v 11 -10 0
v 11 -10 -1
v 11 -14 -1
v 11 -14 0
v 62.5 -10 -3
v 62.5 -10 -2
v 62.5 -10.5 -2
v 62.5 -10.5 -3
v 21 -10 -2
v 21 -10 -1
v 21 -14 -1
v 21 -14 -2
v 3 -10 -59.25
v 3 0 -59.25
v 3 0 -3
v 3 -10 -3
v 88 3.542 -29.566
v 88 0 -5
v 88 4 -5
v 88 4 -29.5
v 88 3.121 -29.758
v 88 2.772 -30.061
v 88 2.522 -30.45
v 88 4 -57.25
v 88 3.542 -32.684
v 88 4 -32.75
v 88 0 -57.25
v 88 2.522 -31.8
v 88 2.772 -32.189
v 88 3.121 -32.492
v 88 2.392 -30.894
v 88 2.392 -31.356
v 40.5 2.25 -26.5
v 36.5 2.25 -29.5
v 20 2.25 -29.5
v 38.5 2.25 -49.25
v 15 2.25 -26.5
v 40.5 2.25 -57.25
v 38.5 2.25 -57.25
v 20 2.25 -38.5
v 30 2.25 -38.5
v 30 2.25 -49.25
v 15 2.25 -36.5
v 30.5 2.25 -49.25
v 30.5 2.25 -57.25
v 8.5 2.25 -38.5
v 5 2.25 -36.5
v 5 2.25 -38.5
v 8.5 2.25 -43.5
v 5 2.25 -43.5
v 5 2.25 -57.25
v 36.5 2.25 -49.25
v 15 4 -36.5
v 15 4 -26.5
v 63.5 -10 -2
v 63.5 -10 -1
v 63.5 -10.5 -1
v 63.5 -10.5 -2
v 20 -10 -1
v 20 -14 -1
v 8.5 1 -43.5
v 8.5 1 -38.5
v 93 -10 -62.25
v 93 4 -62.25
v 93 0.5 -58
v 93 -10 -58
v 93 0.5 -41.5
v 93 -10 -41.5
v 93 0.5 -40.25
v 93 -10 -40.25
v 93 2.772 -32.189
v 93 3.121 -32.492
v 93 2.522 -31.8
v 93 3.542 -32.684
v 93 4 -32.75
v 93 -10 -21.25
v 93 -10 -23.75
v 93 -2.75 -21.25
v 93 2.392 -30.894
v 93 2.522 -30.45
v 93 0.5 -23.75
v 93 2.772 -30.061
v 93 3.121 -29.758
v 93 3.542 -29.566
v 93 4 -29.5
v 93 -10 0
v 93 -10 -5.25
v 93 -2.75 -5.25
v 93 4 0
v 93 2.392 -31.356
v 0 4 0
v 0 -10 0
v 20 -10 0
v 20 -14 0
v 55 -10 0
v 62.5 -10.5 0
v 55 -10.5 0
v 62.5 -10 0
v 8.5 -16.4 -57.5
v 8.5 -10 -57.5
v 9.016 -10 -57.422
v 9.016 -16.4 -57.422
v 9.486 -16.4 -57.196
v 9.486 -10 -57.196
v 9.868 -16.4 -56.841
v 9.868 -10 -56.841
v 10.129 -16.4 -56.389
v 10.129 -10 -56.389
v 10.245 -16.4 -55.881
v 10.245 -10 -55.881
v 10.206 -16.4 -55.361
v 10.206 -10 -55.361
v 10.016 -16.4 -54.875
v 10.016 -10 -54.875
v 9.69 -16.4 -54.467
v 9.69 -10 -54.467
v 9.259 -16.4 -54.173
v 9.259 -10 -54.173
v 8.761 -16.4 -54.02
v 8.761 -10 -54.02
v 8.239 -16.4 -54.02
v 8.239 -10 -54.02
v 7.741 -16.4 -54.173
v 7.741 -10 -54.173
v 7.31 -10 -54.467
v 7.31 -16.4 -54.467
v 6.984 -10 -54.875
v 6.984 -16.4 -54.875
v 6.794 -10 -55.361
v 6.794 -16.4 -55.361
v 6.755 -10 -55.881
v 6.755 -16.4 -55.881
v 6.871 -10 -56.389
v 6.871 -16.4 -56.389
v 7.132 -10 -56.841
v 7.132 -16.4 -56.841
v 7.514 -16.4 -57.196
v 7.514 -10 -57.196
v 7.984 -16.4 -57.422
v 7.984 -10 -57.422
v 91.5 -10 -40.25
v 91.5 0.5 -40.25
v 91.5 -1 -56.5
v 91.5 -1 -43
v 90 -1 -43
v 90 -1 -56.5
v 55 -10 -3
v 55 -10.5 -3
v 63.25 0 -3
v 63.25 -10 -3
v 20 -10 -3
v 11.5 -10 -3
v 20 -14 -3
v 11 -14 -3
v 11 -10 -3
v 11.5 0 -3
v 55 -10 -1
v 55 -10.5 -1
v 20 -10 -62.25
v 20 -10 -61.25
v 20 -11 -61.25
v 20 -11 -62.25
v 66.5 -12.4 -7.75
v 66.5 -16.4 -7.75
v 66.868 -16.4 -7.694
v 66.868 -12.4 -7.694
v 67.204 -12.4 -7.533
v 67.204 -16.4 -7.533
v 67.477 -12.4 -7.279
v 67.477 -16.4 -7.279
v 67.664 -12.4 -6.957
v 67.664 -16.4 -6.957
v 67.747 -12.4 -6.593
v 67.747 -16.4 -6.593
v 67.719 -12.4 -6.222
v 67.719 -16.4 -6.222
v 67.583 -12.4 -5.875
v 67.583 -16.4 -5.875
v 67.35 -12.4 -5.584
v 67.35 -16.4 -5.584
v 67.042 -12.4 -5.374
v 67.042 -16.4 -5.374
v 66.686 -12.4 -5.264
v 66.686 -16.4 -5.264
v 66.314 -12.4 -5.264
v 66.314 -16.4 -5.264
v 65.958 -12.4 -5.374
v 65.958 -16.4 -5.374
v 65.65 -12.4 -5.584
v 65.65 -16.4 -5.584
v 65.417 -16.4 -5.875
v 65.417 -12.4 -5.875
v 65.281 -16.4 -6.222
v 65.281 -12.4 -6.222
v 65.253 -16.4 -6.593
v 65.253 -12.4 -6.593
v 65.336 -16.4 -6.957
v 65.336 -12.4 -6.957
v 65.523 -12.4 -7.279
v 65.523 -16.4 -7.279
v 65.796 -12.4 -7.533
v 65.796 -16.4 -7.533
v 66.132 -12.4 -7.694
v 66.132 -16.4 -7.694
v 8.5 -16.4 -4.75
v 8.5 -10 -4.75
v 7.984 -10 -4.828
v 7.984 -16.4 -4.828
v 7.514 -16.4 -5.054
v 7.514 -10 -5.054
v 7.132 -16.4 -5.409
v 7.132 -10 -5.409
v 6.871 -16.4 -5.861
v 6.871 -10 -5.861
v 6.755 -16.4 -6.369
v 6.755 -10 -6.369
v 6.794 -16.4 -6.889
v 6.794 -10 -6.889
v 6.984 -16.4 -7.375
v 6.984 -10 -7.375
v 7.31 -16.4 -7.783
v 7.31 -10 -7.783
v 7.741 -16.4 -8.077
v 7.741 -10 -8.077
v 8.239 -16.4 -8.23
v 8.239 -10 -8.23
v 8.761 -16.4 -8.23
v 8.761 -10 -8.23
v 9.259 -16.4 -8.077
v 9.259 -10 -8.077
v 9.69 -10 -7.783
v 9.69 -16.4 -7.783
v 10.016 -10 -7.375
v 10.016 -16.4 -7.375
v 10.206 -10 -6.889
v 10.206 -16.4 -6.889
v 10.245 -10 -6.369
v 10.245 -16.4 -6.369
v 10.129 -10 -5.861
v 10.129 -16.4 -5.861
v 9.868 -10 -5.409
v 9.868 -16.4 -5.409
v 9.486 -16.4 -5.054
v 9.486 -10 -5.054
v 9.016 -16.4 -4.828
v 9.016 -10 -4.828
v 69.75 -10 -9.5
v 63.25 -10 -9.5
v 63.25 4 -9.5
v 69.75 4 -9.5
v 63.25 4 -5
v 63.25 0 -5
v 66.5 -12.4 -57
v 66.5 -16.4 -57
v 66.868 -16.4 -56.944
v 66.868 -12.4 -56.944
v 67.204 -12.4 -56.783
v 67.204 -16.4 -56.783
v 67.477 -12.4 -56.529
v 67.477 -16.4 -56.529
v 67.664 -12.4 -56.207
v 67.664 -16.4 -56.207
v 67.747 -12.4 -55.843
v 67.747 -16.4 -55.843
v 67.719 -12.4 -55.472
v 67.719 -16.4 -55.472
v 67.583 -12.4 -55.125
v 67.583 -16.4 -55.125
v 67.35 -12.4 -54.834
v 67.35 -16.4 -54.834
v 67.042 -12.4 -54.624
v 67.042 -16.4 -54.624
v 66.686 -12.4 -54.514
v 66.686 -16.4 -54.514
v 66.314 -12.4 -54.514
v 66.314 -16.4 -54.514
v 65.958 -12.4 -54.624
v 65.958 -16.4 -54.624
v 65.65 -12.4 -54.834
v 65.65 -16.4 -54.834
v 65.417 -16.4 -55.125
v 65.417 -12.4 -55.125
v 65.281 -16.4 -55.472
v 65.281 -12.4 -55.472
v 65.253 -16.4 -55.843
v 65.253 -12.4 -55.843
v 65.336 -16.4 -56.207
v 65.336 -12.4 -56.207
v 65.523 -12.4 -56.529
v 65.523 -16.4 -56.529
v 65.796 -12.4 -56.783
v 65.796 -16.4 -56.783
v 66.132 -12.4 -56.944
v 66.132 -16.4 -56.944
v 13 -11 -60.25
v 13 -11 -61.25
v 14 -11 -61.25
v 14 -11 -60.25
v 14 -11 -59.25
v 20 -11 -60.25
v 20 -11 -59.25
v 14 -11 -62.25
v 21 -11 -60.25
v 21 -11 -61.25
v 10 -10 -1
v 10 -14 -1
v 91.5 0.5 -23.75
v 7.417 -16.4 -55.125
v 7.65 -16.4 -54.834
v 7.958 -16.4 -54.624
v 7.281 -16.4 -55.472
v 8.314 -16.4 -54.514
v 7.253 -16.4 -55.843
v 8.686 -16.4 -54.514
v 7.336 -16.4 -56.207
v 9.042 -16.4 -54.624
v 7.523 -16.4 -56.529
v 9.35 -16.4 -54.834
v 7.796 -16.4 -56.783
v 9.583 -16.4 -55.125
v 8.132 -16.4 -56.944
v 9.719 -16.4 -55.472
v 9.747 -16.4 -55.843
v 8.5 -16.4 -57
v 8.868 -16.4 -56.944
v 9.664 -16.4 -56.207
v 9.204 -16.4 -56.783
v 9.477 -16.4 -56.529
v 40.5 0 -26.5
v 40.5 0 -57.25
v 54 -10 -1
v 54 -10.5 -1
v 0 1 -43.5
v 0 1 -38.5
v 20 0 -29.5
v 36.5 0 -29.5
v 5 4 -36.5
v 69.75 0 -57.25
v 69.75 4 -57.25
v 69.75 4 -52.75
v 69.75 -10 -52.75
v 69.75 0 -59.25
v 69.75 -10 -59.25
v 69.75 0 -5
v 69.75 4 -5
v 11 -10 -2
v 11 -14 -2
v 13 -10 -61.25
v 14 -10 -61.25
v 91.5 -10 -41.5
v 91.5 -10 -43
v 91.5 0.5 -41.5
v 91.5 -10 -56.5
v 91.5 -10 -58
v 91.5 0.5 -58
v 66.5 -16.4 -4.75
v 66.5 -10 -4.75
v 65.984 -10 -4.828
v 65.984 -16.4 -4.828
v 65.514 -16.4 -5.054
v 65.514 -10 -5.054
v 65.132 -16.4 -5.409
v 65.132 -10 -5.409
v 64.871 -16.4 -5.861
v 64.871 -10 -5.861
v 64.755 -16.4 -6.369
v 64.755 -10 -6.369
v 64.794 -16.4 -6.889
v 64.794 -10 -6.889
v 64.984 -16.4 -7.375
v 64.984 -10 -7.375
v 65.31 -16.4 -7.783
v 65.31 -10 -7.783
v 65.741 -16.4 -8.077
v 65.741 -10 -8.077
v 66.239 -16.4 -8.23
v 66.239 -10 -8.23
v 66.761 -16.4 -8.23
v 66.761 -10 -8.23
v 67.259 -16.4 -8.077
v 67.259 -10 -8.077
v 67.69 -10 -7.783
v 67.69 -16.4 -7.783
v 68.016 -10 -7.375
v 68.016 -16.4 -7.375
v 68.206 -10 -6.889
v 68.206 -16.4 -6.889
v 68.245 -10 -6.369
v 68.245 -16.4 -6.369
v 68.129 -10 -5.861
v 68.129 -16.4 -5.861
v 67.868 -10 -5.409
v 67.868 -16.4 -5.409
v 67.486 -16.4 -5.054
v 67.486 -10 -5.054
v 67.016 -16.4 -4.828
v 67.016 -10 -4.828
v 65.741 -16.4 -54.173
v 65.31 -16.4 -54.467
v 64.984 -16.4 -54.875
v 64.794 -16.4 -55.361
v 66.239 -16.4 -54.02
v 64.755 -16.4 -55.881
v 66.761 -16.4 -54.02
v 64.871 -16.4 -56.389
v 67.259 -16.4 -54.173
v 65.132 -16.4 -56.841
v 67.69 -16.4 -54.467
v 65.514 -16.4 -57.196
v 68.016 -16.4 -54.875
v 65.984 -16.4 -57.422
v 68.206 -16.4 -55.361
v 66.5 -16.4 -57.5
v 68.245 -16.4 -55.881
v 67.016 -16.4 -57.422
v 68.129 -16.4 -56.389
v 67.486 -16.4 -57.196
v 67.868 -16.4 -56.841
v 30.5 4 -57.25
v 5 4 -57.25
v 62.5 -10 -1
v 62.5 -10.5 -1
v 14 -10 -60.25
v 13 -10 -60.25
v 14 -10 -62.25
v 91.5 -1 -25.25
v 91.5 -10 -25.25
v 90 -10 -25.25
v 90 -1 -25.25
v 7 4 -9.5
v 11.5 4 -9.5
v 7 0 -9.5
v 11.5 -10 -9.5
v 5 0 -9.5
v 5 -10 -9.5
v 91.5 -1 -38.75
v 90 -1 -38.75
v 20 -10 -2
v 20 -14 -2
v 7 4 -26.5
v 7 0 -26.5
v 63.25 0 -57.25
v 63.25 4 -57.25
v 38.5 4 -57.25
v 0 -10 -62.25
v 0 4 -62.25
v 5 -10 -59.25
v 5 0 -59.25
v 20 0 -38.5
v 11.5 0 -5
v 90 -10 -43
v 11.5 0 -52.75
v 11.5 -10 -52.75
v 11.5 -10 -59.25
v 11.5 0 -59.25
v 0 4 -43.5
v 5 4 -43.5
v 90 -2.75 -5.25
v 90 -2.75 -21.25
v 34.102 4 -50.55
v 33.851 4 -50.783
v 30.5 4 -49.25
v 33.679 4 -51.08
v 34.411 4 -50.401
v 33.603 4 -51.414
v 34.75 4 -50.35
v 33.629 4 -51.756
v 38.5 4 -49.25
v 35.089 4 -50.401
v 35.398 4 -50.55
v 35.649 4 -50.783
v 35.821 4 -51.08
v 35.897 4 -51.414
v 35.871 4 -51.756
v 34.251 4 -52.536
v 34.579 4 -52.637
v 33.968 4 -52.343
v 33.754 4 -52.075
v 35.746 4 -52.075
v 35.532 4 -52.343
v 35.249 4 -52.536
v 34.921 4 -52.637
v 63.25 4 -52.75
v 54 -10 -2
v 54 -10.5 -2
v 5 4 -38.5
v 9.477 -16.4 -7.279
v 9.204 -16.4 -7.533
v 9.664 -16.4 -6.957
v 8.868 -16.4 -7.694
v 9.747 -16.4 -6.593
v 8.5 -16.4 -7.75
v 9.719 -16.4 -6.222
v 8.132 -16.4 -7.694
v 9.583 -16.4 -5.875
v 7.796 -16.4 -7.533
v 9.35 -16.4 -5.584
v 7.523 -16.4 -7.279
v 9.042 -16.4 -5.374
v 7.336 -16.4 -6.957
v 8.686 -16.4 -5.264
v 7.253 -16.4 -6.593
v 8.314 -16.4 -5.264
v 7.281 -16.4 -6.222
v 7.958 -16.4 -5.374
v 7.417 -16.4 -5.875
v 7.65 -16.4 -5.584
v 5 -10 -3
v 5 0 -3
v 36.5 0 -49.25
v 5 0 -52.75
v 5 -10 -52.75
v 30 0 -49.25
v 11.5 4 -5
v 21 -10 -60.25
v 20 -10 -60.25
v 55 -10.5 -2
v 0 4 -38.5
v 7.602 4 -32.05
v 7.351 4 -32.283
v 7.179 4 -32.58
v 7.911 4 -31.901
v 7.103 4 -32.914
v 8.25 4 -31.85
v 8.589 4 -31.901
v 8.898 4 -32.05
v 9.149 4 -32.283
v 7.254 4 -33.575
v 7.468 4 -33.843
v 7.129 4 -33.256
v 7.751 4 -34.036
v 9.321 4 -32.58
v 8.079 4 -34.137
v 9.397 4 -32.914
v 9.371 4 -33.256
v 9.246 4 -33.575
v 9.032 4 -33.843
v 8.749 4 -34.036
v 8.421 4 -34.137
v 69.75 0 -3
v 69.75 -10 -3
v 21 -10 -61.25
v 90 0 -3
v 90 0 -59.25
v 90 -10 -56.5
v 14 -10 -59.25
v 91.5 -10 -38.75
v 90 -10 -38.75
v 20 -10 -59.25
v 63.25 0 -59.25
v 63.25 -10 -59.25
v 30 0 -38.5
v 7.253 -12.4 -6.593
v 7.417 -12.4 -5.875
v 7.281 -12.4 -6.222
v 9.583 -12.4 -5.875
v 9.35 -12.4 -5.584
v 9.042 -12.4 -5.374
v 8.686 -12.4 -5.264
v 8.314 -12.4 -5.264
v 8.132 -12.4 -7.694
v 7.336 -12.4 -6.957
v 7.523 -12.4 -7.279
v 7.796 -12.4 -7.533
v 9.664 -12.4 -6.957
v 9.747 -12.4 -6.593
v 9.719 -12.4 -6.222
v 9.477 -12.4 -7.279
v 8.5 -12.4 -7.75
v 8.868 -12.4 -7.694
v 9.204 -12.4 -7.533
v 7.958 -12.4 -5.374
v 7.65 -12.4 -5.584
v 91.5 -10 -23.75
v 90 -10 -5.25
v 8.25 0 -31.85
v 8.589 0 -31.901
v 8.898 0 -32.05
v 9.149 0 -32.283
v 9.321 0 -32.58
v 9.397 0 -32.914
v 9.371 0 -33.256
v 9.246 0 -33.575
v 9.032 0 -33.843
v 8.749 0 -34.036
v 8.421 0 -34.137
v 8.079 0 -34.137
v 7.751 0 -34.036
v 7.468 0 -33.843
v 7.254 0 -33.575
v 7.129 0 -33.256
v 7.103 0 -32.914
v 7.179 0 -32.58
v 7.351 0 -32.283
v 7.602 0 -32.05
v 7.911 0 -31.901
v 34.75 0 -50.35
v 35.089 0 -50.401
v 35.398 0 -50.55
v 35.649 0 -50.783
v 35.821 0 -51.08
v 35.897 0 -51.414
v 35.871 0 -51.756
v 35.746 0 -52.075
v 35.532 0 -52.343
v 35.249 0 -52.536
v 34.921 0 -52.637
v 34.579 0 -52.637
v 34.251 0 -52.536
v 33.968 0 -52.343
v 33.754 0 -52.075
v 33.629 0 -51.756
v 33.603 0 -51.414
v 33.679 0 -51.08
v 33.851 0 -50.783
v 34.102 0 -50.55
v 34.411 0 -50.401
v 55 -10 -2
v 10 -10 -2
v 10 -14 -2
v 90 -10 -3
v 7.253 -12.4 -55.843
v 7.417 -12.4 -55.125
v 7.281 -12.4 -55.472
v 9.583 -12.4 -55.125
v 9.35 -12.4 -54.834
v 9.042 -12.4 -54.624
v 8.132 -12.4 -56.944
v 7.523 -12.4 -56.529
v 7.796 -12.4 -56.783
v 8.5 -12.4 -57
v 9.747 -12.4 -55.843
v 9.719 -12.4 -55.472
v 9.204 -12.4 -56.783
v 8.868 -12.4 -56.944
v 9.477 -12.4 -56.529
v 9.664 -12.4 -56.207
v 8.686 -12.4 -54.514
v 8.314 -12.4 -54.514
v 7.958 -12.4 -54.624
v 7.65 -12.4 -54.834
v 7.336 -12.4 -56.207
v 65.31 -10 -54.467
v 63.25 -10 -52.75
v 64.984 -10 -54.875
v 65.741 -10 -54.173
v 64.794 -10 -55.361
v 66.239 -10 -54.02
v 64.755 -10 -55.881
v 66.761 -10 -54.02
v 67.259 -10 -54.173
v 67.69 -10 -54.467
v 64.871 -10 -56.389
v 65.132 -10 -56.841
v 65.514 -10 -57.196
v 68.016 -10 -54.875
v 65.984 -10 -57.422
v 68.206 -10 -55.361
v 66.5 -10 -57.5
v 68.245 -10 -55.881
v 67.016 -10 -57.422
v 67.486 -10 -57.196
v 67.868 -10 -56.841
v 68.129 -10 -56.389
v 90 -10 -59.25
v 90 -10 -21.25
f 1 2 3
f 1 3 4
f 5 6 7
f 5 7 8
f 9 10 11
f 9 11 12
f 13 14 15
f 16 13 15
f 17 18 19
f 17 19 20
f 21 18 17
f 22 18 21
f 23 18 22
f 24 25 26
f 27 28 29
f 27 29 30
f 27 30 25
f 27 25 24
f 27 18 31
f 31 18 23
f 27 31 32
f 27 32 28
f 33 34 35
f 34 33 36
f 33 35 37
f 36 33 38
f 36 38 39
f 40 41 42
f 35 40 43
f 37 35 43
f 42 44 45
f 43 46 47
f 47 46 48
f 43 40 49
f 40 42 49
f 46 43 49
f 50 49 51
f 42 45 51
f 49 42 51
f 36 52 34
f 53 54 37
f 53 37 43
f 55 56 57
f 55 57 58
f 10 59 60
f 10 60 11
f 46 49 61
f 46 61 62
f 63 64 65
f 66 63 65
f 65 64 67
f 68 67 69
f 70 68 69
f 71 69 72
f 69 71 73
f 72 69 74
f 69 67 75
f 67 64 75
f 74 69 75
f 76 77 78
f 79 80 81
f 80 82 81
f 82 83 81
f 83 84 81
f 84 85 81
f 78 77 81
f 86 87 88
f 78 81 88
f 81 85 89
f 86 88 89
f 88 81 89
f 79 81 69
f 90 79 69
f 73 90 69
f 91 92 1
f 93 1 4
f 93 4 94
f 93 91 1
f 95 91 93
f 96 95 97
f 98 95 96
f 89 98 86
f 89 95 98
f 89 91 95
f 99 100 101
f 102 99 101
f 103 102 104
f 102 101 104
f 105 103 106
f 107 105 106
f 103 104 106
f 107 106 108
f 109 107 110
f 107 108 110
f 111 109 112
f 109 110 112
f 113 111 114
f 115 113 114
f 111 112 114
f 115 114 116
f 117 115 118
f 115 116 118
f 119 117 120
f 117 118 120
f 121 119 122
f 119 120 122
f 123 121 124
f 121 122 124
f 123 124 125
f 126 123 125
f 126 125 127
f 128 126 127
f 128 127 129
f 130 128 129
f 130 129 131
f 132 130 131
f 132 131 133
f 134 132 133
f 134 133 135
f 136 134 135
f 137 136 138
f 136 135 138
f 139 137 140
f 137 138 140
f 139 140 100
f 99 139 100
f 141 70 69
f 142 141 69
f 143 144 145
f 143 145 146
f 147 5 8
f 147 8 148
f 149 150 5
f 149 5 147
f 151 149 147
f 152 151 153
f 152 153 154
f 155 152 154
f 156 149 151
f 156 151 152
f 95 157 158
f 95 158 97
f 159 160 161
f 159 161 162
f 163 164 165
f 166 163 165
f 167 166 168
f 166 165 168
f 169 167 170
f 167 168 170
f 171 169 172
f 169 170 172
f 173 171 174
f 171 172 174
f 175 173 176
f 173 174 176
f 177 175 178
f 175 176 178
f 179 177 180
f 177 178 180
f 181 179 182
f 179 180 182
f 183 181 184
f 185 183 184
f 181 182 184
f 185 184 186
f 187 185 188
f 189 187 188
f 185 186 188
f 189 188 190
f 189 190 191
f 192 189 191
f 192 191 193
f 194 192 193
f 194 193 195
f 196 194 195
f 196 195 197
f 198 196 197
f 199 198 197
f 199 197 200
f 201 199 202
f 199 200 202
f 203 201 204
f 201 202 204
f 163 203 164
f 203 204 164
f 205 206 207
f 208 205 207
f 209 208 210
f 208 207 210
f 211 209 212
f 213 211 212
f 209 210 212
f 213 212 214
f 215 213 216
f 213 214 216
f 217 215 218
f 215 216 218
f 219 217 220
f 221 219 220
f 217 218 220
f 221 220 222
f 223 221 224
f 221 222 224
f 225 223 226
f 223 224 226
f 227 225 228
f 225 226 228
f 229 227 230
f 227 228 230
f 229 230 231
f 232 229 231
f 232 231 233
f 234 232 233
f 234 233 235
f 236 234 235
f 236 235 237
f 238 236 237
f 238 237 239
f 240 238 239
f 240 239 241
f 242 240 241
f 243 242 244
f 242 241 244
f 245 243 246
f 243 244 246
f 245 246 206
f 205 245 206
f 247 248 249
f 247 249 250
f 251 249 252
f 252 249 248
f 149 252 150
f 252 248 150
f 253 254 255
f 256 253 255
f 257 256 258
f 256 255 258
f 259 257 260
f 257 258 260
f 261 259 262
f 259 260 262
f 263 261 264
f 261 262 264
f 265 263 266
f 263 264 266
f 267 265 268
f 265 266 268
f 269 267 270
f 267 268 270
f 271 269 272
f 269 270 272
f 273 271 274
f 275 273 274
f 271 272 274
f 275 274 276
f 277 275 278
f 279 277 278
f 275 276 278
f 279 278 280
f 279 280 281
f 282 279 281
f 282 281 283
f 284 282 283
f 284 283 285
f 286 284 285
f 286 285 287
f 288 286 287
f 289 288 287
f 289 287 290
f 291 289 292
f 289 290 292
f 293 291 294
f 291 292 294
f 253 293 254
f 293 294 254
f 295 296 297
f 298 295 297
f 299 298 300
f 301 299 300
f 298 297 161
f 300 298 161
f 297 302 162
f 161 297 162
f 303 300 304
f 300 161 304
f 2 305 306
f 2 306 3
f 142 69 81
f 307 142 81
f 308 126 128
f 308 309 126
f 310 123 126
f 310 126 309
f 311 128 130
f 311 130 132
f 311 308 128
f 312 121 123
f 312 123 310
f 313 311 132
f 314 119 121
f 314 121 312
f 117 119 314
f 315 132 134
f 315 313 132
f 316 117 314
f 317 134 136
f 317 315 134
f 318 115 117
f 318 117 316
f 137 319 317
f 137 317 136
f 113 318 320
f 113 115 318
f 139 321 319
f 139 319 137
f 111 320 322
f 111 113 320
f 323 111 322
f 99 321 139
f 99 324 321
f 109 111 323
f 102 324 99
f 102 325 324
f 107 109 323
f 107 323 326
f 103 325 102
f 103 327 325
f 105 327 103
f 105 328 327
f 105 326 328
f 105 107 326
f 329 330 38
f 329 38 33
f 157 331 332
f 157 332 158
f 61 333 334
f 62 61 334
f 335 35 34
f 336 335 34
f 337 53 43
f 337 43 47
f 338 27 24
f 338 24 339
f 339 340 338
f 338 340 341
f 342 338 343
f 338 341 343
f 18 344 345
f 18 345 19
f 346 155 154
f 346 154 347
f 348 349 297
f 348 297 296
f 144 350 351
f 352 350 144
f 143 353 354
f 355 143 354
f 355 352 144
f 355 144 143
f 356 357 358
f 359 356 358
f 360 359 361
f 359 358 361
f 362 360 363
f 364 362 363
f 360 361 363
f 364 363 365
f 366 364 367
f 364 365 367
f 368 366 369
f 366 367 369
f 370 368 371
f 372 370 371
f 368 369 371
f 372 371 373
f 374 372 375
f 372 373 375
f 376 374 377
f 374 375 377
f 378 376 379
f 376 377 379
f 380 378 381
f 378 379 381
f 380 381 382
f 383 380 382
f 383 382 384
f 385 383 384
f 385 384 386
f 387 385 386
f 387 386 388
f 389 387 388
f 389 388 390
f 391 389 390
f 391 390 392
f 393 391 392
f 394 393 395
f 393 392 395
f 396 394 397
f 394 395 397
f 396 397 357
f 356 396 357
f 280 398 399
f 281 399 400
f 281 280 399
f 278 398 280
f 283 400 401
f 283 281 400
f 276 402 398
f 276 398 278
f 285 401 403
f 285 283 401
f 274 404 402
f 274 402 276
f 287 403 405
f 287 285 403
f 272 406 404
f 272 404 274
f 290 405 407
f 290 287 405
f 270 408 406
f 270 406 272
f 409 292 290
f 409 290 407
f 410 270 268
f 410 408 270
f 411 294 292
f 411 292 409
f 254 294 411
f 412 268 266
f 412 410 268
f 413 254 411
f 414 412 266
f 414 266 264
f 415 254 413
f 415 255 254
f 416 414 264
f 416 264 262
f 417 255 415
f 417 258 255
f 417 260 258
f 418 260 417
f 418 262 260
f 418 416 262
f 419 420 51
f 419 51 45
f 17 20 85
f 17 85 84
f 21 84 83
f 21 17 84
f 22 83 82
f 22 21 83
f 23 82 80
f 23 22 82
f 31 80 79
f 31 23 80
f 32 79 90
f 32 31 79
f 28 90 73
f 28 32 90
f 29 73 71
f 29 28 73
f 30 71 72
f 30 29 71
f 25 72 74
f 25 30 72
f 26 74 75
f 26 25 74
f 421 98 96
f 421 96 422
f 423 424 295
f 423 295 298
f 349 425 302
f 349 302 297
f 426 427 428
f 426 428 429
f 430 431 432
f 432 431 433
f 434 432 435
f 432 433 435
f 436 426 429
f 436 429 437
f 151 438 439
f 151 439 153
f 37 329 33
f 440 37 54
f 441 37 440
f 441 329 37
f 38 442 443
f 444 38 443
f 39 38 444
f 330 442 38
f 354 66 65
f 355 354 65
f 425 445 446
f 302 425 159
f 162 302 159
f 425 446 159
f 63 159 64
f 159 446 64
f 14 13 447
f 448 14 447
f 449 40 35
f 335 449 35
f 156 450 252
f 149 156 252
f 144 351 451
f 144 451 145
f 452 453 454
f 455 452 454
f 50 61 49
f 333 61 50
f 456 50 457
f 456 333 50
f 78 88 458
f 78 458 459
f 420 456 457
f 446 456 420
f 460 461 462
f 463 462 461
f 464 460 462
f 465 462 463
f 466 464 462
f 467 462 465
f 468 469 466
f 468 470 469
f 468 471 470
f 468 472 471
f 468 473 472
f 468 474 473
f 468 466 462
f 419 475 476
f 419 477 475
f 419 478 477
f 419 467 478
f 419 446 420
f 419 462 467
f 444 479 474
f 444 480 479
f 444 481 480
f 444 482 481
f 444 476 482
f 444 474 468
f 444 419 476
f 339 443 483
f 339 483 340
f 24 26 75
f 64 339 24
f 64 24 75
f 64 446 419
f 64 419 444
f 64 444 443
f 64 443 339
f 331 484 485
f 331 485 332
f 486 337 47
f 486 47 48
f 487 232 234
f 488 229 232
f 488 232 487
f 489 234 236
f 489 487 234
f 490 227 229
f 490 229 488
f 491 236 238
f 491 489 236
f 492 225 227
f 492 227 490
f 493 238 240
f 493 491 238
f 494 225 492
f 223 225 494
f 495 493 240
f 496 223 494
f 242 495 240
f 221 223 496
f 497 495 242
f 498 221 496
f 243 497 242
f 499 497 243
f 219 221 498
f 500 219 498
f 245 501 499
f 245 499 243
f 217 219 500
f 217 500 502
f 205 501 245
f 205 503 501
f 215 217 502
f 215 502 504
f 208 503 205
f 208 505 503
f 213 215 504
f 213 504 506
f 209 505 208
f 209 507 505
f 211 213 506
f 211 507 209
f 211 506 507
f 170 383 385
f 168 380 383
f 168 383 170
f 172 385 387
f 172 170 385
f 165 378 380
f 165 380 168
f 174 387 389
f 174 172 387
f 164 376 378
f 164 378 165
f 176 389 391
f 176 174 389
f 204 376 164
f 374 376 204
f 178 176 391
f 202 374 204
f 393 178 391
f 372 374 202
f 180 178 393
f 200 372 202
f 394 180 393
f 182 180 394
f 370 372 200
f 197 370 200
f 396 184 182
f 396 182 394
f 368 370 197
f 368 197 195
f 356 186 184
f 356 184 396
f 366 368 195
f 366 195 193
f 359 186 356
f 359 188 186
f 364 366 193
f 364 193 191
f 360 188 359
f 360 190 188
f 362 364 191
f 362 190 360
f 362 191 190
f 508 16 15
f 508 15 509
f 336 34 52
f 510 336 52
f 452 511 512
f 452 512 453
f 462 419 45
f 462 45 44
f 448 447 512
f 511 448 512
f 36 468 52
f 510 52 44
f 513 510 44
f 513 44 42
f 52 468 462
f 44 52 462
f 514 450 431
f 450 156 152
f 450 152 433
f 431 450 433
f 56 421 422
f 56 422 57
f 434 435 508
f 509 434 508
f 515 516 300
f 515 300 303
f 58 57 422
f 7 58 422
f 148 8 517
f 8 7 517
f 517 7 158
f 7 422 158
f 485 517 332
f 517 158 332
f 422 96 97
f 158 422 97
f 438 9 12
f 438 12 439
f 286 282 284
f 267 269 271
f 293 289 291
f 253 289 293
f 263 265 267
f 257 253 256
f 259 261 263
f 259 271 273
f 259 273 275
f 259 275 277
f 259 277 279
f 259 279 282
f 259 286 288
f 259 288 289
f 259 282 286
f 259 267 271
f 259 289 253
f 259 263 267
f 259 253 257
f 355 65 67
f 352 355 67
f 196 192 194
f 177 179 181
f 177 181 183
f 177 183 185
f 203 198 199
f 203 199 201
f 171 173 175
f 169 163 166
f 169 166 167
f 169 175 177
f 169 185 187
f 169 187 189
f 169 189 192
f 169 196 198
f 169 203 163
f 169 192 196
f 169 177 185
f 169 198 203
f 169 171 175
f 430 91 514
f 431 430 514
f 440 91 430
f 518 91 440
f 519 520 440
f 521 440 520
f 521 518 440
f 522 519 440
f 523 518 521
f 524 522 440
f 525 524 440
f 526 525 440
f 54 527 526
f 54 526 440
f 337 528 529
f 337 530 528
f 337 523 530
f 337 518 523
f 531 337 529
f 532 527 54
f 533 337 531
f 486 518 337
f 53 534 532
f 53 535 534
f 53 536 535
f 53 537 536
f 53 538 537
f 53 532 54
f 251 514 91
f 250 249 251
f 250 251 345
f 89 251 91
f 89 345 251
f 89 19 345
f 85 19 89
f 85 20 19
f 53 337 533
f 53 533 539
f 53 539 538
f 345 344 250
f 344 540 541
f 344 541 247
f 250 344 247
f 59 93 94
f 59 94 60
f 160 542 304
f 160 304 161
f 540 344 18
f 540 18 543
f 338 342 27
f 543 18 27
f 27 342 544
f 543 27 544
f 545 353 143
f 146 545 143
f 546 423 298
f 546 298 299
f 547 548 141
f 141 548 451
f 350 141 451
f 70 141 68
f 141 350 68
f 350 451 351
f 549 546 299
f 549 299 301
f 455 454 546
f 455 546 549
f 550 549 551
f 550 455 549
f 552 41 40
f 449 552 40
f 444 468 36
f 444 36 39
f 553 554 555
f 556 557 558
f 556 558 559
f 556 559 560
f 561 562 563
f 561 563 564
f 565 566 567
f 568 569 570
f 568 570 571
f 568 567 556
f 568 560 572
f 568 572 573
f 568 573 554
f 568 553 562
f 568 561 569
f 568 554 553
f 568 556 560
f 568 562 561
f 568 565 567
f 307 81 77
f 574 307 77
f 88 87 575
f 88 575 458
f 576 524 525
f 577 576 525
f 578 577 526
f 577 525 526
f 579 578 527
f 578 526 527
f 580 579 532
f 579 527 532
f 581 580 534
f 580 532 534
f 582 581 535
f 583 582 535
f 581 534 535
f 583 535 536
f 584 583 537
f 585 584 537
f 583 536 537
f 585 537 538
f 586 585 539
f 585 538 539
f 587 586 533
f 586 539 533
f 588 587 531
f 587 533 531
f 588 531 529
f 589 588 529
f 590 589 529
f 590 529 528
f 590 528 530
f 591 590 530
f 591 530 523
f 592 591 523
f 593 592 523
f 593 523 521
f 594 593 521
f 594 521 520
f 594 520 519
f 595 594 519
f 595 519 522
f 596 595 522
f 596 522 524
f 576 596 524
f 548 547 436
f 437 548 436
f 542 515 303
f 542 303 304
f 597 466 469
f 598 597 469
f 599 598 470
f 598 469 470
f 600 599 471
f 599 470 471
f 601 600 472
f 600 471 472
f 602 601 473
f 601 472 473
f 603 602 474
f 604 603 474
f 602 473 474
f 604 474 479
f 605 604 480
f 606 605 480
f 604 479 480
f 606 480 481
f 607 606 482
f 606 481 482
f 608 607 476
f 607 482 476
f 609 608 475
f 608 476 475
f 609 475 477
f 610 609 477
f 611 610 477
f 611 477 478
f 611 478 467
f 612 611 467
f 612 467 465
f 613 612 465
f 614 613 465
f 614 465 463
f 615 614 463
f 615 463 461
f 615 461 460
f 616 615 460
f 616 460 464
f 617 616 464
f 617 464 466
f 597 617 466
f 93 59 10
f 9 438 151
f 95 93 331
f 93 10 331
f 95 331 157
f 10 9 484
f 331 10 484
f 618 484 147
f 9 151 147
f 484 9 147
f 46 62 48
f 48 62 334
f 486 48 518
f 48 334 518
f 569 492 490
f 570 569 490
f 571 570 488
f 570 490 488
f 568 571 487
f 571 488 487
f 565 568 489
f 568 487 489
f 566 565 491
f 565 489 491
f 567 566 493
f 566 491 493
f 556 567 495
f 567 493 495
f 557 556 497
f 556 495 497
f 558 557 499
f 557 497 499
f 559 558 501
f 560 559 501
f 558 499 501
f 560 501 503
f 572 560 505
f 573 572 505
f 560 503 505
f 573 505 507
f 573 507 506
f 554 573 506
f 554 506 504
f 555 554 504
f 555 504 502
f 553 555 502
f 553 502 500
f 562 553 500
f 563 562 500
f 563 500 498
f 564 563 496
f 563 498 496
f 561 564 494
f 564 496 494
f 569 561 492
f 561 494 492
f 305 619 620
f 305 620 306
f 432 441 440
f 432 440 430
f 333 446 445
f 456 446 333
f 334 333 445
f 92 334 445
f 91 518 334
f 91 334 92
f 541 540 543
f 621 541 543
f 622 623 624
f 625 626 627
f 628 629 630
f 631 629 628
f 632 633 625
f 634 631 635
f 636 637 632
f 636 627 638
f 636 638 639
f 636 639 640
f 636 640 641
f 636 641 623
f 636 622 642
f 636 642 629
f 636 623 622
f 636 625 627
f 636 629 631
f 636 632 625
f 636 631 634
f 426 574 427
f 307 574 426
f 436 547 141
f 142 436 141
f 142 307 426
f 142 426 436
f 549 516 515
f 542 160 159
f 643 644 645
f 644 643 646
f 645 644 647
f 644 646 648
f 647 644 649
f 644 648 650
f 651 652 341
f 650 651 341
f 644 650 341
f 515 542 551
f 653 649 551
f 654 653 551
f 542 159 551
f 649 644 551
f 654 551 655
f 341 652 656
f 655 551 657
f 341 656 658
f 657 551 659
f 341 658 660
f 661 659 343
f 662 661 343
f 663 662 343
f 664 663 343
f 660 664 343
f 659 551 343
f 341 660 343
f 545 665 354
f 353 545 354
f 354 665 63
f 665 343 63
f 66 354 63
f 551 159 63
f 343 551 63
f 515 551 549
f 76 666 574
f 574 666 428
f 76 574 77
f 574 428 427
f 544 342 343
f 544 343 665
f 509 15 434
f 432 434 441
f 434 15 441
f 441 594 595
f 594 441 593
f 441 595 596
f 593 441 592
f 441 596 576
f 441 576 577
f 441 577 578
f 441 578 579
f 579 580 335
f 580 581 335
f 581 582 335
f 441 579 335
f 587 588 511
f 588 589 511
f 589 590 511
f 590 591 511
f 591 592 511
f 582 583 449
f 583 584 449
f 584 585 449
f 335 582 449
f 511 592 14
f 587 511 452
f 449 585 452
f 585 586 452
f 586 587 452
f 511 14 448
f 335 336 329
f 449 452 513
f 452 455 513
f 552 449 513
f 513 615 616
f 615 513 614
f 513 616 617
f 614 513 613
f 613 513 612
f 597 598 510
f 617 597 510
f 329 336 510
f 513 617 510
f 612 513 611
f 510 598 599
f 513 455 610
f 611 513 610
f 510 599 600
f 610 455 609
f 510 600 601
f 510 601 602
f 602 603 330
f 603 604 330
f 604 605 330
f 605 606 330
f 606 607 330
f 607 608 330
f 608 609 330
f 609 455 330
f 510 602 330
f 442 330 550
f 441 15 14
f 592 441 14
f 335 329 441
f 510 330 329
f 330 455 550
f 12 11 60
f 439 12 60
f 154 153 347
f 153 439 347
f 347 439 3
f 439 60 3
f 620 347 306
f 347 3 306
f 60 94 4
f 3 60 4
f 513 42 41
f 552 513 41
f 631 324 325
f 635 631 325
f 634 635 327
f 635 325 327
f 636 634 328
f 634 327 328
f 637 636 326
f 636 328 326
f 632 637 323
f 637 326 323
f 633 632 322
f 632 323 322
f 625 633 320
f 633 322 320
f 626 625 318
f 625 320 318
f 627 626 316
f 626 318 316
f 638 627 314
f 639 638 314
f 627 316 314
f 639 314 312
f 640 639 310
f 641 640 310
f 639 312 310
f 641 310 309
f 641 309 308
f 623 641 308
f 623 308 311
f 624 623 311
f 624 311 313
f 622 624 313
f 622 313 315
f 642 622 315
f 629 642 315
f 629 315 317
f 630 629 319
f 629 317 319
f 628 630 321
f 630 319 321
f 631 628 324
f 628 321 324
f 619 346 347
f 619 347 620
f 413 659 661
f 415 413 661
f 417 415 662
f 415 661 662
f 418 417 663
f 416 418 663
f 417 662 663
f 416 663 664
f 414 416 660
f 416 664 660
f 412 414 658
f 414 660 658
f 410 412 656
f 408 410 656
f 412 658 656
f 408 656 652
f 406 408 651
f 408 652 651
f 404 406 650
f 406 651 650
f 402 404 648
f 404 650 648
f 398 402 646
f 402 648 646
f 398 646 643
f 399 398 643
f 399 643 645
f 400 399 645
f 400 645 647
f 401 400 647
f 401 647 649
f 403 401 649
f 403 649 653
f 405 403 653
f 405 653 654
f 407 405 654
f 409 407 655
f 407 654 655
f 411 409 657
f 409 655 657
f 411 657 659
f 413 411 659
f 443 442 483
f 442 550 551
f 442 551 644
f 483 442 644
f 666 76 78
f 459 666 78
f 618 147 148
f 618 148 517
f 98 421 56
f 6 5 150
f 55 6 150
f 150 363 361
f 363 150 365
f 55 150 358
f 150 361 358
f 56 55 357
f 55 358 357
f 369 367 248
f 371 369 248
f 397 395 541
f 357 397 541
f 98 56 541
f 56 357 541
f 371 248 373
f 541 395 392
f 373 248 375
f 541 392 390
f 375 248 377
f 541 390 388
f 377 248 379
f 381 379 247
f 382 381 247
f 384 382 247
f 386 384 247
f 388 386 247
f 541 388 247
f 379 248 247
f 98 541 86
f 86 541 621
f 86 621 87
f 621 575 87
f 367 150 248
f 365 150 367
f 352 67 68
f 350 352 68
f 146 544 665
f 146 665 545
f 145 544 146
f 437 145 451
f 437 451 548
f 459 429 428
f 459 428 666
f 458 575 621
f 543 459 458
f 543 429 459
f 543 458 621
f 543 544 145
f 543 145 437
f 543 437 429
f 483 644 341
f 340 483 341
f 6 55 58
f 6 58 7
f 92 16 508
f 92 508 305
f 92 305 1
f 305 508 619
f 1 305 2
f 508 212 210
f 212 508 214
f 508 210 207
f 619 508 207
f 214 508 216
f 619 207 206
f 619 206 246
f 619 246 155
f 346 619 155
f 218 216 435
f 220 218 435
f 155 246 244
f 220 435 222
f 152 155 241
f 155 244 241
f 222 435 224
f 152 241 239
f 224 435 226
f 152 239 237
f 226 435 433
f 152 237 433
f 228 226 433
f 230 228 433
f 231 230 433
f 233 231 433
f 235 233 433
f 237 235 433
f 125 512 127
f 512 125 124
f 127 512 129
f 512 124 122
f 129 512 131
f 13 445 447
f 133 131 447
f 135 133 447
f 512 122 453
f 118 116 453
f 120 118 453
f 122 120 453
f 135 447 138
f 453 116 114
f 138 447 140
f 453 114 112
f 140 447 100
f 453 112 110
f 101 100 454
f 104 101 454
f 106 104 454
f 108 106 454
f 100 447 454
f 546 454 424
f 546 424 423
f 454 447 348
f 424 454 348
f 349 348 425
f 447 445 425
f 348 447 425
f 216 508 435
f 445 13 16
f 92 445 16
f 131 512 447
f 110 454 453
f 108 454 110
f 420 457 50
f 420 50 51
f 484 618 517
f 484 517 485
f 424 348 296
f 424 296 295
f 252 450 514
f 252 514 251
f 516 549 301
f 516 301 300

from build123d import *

# Parameters (mm, degrees)
SKETCH1_W               = 93
SKETCH1_H               = 62.25
BOSS_EXTRUDE1_DEPTH     = 4
CUT_EXTRUDE1_DEPTH      = 1.75
CUT_EXTRUDE2_DEPTH      = 112.933574052
SKETCH7_R               = 1.15
CUT_EXTRUDE3_DEPTH      = 112.982420495
SKETCH8_W               = 93
SKETCH8_H               = 62.25
SKETCH8_W_2             = 87
SKETCH8_H_2             = 56.25
BOSS_EXTRUDE3_DEPTH     = 10
BOSS_EXTRUDE7_START     = -14
SKETCH16_W              = 6.5
SKETCH16_H              = 4.5
SKETCH16_H_2            = 2
SKETCH16_W_2            = 4.5
BOSS_EXTRUDE7_DEPTH     = 14
SKETCH9_W               = 16
SKETCH9_H               = 7.25
SKETCH9_W_2             = 13.5
SKETCH9_H_2             = 9
CUT_EXTRUDE4_DEPTH      = 3
CUT_EXTRUDE5_DEPTH      = 1.5
CUT_EXTRUDE6_DEPTH      = 113.356853374
CUT_EXTRUDE6_DEPTH_BACK = 5
BOSS_EXTRUDE4_DEPTH     = 1
BOSS_EXTRUDE5_DEPTH     = 4
SKETCH14_W              = 5
SKETCH14_H              = 3
CUT_EXTRUDE8_DEPTH      = 8.5
BOSS_EXTRUDE6_DEPTH     = 0.5
SKETCH17_W              = 6.5
SKETCH17_H              = 4.5
CUT_EXTRUDE9_DEPTH      = 1.75
SKETCH18_R              = 1.75
BOSS_EXTRUDE8_DEPTH     = 6.4
SKETCH19_R              = 1.25
CUT_EXTRUDE10_DEPTH     = 4


with BuildPart() as part:
    # Sketch1 → Boss-Extrude1 (new body)
    with BuildSketch(Plane(origin=(0, 0, 0), x_dir=(1, 0, 0), z_dir=(0, 1, 0))):
        with Locations((46.5, 31.125)):
            Rectangle(SKETCH1_W, SKETCH1_H)
        Polygon((7, 5), (88, 5), (88, 57.25), (40.5, 57.25), (40.5, 26.5), (7, 26.5), align=None, mode=Mode.SUBTRACT)
    extrude(amount=BOSS_EXTRUDE1_DEPTH)

    # Sketch5 → Cut-Extrude1 (cut)
    with BuildSketch(Plane(origin=(0, 4, 0), x_dir=(1, 0, 0), z_dir=(0, 1, 0))):
        Polygon((40.5, 26.5), (15, 26.5), (15, 36.5), (5, 36.5), (5, 57.25), (30.5, 57.25), (30.5, 49.25), (38.5, 49.25), (38.5, 57.25), (40.5, 57.25), align=None)
    extrude(amount=-CUT_EXTRUDE1_DEPTH, mode=Mode.SUBTRACT)

    # Sketch6 → Cut-Extrude2 (cut, through all)
    with BuildSketch(Plane(origin=(0, 2.25, 0), x_dir=(1, 0, 0), z_dir=(0, 1, 0))):
        Polygon((30.5, 49.25), (30, 49.25), (30, 38.5), (20, 38.5), (20, 29.5), (28.25, 29.5), (36.5, 29.5), (36.5, 39.375), (36.5, 49.25), align=None)
    extrude(amount=-CUT_EXTRUDE2_DEPTH, mode=Mode.SUBTRACT)

    # Sketch7 → Cut-Extrude3 (cut, through all)
    with BuildSketch(Plane(origin=(0, 4, 0), x_dir=(1, 0, 0), z_dir=(0, 1, 0))):
        with Locations(Location((8.25, 33, 0), (0, 0, 270))):
            Circle(SKETCH7_R)
        with Locations(Location((34.75, 51.5, 0), (0, 0, 270))):
            Circle(SKETCH7_R)
    extrude(amount=-CUT_EXTRUDE3_DEPTH, mode=Mode.SUBTRACT)

    # Sketch8 → Boss-Extrude3 (add)
    with BuildSketch(Plane.XZ):
        with Locations((46.5, -31.125)):
            Rectangle(SKETCH8_W, SKETCH8_H)
        with Locations((46.5, -31.125)):
            Rectangle(SKETCH8_W_2, SKETCH8_H_2, mode=Mode.SUBTRACT)
    extrude(amount=BOSS_EXTRUDE3_DEPTH)

    # Sketch16 → Boss-Extrude7 (add)
    with BuildSketch(Plane(origin=(0, 4, 0), x_dir=(1, 0, 0), z_dir=(0, 1, 0)).offset(BOSS_EXTRUDE7_START)):
        with Locations((66.5, 7.25)):
            Rectangle(SKETCH16_W, SKETCH16_H)
        with Locations((66.5, 4)):
            Rectangle(SKETCH16_W, SKETCH16_H_2)
        with Locations((66.5, 55)):
            Rectangle(SKETCH16_W, SKETCH16_H)
        with Locations((66.5, 58.25)):
            Rectangle(SKETCH16_W, SKETCH16_H_2)
        with Locations((8.25, 58.25)):
            Rectangle(SKETCH16_W, SKETCH16_H_2)
        Polygon((5, 57.25), (5, 52.75), (7, 52.75), (11.5, 52.75), (11.5, 57.25), align=None)
        with Locations((9.25, 7.25)):
            Rectangle(SKETCH16_W_2, SKETCH16_H)
        Polygon((7, 5), (7, 9.5), (5, 9.5), (5, 3), (11.5, 3), (11.5, 5), align=None)
    extrude(amount=BOSS_EXTRUDE7_DEPTH)

    # Sketch9 → Cut-Extrude4 (cut)
    with BuildSketch(Plane(origin=(93, 0, 0), x_dir=(0, 0, -1), z_dir=(1, 0, 0))):
        with Locations((13.25, -6.375)):
            Rectangle(SKETCH9_W, SKETCH9_H)
        with Locations((32, -5.5)):
            Rectangle(SKETCH9_W_2, SKETCH9_H_2)
        with Locations((49.75, -5.5)):
            Rectangle(SKETCH9_W_2, SKETCH9_H_2)
    extrude(amount=-CUT_EXTRUDE4_DEPTH, mode=Mode.SUBTRACT)

    # Sketch10 → Cut-Extrude5 (cut)
    with BuildSketch(Plane(origin=(93, 0, 0), x_dir=(0, 0, -1), z_dir=(1, 0, 0))):
        Polygon((25.25, -10), (25.25, -1), (38.75, -1), (38.75, -10), (40.25, -10), (40.25, 0.5), (23.75, 0.5), (23.75, -10), align=None)
        Polygon((43, -10), (43, -1), (56.5, -1), (56.5, -10), (58, -10), (58, 0.5), (41.5, 0.5), (41.5, -10), align=None)
    extrude(amount=-CUT_EXTRUDE5_DEPTH, mode=Mode.SUBTRACT)

    # Sketch11 → Cut-Extrude6 (cut, two sides: drawn at the far end of the back side and taken through both)
    with BuildSketch(Plane(origin=(93, 0, 0), x_dir=(0, 0, -1), z_dir=(1, 0, 0)).offset(-CUT_EXTRUDE6_DEPTH_BACK)):
        with BuildLine():
            Line((29.5, 85.233770081), (29.5, 4))
            ThreePointArc((29.5, 4), (31.125, 2.375), (32.75, 4))
            Line((32.75, 4), (32.75, 85.233770081))
            Line((32.75, 85.233770081), (32.75, 247.701310244))
            Line((32.75, 247.701310244), (29.5, 247.701310244))
            Line((29.5, 247.701310244), (29.5, 85.233770081))
        make_face()
    extrude(amount=CUT_EXTRUDE6_DEPTH + CUT_EXTRUDE6_DEPTH_BACK, mode=Mode.SUBTRACT)

    # Sketch12 → Boss-Extrude4 (add)
    with BuildSketch(Plane(origin=(0, -10, 0), x_dir=(-1, 0, 0), z_dir=(0, -1, 0))):
        Polygon((-20, 62.25), (-14, 62.25), (-14, 61.25), (-13, 61.25), (-13, 60.25), (-14, 60.25), (-14, 59.25), (-20, 59.25), (-20, 60.25), (-21, 60.25), (-21, 61.25), (-20, 61.25), align=None)
    extrude(amount=BOSS_EXTRUDE4_DEPTH)

    # Sketch13 → Boss-Extrude5 (add)
    with BuildSketch(Plane.XZ.offset(10)):
        Polygon((20, -3), (11, -3), (11, -2), (10, -2), (10, -1), (11, -1), (11, 0), (20, 0), (20, -1), (21, -1), (21, -2), (20, -2), align=None)
    extrude(amount=BOSS_EXTRUDE5_DEPTH)

    # Sketch14 → Cut-Extrude8 (cut)
    with BuildSketch(Plane.ZY):
        with Locations((-41, 2.5)):
            Rectangle(SKETCH14_W, SKETCH14_H)
    extrude(amount=-CUT_EXTRUDE8_DEPTH, mode=Mode.SUBTRACT)

    # Sketch15 → Boss-Extrude6 (add)
    with BuildSketch(Plane.XZ.offset(10)):
        Polygon((62.5, -3), (55, -3), (55, -2), (54, -2), (54, -1), (55, -1), (55, 0), (62.5, 0), (62.5, -1), (63.5, -1), (63.5, -2), (62.5, -2), align=None)
    extrude(amount=BOSS_EXTRUDE6_DEPTH)

    # Sketch17 → Cut-Extrude9 (cut)
    with BuildSketch(Plane(origin=(0, 4, 0), x_dir=(1, 0, 0), z_dir=(0, 1, 0))):
        with Locations((8.25, 55)):
            Rectangle(SKETCH17_W, SKETCH17_H)
    extrude(amount=-CUT_EXTRUDE9_DEPTH, mode=Mode.SUBTRACT)

    # Sketch18 → Boss-Extrude8 (add)
    with BuildSketch(Plane(origin=(0, -10, 0), x_dir=(-1, 0, 0), z_dir=(0, -1, 0))):
        with Locations(Location((-8.5, 55.75, 0), (0, 0, 90))):
            Circle(SKETCH18_R)
        with Locations(Location((-66.5, 55.75, 0), (0, 0, 90))):
            Circle(SKETCH18_R)
        with Locations(Location((-66.5, 6.5, 0), (0, 0, 270))):
            Circle(SKETCH18_R)
        with Locations(Location((-8.5, 6.5, 0), (0, 0, 270))):
            Circle(SKETCH18_R)
    extrude(amount=BOSS_EXTRUDE8_DEPTH)

    # Sketch19 → Cut-Extrude10 (cut)
    with BuildSketch(Plane.XZ.offset(16.4)):
        with Locations(Location((8.5, -6.5, 0), (0, 0, 270))):
            Circle(SKETCH19_R)
        with Locations(Location((8.5, -55.75, 0), (0, 0, 270))):
            Circle(SKETCH19_R)
        with Locations(Location((66.5, -55.75, 0), (0, 0, 270))):
            Circle(SKETCH19_R)
        with Locations(Location((66.5, -6.5, 0), (0, 0, 270))):
            Circle(SKETCH19_R)
    extrude(amount=-CUT_EXTRUDE10_DEPTH, mode=Mode.SUBTRACT)


solid = part.part
